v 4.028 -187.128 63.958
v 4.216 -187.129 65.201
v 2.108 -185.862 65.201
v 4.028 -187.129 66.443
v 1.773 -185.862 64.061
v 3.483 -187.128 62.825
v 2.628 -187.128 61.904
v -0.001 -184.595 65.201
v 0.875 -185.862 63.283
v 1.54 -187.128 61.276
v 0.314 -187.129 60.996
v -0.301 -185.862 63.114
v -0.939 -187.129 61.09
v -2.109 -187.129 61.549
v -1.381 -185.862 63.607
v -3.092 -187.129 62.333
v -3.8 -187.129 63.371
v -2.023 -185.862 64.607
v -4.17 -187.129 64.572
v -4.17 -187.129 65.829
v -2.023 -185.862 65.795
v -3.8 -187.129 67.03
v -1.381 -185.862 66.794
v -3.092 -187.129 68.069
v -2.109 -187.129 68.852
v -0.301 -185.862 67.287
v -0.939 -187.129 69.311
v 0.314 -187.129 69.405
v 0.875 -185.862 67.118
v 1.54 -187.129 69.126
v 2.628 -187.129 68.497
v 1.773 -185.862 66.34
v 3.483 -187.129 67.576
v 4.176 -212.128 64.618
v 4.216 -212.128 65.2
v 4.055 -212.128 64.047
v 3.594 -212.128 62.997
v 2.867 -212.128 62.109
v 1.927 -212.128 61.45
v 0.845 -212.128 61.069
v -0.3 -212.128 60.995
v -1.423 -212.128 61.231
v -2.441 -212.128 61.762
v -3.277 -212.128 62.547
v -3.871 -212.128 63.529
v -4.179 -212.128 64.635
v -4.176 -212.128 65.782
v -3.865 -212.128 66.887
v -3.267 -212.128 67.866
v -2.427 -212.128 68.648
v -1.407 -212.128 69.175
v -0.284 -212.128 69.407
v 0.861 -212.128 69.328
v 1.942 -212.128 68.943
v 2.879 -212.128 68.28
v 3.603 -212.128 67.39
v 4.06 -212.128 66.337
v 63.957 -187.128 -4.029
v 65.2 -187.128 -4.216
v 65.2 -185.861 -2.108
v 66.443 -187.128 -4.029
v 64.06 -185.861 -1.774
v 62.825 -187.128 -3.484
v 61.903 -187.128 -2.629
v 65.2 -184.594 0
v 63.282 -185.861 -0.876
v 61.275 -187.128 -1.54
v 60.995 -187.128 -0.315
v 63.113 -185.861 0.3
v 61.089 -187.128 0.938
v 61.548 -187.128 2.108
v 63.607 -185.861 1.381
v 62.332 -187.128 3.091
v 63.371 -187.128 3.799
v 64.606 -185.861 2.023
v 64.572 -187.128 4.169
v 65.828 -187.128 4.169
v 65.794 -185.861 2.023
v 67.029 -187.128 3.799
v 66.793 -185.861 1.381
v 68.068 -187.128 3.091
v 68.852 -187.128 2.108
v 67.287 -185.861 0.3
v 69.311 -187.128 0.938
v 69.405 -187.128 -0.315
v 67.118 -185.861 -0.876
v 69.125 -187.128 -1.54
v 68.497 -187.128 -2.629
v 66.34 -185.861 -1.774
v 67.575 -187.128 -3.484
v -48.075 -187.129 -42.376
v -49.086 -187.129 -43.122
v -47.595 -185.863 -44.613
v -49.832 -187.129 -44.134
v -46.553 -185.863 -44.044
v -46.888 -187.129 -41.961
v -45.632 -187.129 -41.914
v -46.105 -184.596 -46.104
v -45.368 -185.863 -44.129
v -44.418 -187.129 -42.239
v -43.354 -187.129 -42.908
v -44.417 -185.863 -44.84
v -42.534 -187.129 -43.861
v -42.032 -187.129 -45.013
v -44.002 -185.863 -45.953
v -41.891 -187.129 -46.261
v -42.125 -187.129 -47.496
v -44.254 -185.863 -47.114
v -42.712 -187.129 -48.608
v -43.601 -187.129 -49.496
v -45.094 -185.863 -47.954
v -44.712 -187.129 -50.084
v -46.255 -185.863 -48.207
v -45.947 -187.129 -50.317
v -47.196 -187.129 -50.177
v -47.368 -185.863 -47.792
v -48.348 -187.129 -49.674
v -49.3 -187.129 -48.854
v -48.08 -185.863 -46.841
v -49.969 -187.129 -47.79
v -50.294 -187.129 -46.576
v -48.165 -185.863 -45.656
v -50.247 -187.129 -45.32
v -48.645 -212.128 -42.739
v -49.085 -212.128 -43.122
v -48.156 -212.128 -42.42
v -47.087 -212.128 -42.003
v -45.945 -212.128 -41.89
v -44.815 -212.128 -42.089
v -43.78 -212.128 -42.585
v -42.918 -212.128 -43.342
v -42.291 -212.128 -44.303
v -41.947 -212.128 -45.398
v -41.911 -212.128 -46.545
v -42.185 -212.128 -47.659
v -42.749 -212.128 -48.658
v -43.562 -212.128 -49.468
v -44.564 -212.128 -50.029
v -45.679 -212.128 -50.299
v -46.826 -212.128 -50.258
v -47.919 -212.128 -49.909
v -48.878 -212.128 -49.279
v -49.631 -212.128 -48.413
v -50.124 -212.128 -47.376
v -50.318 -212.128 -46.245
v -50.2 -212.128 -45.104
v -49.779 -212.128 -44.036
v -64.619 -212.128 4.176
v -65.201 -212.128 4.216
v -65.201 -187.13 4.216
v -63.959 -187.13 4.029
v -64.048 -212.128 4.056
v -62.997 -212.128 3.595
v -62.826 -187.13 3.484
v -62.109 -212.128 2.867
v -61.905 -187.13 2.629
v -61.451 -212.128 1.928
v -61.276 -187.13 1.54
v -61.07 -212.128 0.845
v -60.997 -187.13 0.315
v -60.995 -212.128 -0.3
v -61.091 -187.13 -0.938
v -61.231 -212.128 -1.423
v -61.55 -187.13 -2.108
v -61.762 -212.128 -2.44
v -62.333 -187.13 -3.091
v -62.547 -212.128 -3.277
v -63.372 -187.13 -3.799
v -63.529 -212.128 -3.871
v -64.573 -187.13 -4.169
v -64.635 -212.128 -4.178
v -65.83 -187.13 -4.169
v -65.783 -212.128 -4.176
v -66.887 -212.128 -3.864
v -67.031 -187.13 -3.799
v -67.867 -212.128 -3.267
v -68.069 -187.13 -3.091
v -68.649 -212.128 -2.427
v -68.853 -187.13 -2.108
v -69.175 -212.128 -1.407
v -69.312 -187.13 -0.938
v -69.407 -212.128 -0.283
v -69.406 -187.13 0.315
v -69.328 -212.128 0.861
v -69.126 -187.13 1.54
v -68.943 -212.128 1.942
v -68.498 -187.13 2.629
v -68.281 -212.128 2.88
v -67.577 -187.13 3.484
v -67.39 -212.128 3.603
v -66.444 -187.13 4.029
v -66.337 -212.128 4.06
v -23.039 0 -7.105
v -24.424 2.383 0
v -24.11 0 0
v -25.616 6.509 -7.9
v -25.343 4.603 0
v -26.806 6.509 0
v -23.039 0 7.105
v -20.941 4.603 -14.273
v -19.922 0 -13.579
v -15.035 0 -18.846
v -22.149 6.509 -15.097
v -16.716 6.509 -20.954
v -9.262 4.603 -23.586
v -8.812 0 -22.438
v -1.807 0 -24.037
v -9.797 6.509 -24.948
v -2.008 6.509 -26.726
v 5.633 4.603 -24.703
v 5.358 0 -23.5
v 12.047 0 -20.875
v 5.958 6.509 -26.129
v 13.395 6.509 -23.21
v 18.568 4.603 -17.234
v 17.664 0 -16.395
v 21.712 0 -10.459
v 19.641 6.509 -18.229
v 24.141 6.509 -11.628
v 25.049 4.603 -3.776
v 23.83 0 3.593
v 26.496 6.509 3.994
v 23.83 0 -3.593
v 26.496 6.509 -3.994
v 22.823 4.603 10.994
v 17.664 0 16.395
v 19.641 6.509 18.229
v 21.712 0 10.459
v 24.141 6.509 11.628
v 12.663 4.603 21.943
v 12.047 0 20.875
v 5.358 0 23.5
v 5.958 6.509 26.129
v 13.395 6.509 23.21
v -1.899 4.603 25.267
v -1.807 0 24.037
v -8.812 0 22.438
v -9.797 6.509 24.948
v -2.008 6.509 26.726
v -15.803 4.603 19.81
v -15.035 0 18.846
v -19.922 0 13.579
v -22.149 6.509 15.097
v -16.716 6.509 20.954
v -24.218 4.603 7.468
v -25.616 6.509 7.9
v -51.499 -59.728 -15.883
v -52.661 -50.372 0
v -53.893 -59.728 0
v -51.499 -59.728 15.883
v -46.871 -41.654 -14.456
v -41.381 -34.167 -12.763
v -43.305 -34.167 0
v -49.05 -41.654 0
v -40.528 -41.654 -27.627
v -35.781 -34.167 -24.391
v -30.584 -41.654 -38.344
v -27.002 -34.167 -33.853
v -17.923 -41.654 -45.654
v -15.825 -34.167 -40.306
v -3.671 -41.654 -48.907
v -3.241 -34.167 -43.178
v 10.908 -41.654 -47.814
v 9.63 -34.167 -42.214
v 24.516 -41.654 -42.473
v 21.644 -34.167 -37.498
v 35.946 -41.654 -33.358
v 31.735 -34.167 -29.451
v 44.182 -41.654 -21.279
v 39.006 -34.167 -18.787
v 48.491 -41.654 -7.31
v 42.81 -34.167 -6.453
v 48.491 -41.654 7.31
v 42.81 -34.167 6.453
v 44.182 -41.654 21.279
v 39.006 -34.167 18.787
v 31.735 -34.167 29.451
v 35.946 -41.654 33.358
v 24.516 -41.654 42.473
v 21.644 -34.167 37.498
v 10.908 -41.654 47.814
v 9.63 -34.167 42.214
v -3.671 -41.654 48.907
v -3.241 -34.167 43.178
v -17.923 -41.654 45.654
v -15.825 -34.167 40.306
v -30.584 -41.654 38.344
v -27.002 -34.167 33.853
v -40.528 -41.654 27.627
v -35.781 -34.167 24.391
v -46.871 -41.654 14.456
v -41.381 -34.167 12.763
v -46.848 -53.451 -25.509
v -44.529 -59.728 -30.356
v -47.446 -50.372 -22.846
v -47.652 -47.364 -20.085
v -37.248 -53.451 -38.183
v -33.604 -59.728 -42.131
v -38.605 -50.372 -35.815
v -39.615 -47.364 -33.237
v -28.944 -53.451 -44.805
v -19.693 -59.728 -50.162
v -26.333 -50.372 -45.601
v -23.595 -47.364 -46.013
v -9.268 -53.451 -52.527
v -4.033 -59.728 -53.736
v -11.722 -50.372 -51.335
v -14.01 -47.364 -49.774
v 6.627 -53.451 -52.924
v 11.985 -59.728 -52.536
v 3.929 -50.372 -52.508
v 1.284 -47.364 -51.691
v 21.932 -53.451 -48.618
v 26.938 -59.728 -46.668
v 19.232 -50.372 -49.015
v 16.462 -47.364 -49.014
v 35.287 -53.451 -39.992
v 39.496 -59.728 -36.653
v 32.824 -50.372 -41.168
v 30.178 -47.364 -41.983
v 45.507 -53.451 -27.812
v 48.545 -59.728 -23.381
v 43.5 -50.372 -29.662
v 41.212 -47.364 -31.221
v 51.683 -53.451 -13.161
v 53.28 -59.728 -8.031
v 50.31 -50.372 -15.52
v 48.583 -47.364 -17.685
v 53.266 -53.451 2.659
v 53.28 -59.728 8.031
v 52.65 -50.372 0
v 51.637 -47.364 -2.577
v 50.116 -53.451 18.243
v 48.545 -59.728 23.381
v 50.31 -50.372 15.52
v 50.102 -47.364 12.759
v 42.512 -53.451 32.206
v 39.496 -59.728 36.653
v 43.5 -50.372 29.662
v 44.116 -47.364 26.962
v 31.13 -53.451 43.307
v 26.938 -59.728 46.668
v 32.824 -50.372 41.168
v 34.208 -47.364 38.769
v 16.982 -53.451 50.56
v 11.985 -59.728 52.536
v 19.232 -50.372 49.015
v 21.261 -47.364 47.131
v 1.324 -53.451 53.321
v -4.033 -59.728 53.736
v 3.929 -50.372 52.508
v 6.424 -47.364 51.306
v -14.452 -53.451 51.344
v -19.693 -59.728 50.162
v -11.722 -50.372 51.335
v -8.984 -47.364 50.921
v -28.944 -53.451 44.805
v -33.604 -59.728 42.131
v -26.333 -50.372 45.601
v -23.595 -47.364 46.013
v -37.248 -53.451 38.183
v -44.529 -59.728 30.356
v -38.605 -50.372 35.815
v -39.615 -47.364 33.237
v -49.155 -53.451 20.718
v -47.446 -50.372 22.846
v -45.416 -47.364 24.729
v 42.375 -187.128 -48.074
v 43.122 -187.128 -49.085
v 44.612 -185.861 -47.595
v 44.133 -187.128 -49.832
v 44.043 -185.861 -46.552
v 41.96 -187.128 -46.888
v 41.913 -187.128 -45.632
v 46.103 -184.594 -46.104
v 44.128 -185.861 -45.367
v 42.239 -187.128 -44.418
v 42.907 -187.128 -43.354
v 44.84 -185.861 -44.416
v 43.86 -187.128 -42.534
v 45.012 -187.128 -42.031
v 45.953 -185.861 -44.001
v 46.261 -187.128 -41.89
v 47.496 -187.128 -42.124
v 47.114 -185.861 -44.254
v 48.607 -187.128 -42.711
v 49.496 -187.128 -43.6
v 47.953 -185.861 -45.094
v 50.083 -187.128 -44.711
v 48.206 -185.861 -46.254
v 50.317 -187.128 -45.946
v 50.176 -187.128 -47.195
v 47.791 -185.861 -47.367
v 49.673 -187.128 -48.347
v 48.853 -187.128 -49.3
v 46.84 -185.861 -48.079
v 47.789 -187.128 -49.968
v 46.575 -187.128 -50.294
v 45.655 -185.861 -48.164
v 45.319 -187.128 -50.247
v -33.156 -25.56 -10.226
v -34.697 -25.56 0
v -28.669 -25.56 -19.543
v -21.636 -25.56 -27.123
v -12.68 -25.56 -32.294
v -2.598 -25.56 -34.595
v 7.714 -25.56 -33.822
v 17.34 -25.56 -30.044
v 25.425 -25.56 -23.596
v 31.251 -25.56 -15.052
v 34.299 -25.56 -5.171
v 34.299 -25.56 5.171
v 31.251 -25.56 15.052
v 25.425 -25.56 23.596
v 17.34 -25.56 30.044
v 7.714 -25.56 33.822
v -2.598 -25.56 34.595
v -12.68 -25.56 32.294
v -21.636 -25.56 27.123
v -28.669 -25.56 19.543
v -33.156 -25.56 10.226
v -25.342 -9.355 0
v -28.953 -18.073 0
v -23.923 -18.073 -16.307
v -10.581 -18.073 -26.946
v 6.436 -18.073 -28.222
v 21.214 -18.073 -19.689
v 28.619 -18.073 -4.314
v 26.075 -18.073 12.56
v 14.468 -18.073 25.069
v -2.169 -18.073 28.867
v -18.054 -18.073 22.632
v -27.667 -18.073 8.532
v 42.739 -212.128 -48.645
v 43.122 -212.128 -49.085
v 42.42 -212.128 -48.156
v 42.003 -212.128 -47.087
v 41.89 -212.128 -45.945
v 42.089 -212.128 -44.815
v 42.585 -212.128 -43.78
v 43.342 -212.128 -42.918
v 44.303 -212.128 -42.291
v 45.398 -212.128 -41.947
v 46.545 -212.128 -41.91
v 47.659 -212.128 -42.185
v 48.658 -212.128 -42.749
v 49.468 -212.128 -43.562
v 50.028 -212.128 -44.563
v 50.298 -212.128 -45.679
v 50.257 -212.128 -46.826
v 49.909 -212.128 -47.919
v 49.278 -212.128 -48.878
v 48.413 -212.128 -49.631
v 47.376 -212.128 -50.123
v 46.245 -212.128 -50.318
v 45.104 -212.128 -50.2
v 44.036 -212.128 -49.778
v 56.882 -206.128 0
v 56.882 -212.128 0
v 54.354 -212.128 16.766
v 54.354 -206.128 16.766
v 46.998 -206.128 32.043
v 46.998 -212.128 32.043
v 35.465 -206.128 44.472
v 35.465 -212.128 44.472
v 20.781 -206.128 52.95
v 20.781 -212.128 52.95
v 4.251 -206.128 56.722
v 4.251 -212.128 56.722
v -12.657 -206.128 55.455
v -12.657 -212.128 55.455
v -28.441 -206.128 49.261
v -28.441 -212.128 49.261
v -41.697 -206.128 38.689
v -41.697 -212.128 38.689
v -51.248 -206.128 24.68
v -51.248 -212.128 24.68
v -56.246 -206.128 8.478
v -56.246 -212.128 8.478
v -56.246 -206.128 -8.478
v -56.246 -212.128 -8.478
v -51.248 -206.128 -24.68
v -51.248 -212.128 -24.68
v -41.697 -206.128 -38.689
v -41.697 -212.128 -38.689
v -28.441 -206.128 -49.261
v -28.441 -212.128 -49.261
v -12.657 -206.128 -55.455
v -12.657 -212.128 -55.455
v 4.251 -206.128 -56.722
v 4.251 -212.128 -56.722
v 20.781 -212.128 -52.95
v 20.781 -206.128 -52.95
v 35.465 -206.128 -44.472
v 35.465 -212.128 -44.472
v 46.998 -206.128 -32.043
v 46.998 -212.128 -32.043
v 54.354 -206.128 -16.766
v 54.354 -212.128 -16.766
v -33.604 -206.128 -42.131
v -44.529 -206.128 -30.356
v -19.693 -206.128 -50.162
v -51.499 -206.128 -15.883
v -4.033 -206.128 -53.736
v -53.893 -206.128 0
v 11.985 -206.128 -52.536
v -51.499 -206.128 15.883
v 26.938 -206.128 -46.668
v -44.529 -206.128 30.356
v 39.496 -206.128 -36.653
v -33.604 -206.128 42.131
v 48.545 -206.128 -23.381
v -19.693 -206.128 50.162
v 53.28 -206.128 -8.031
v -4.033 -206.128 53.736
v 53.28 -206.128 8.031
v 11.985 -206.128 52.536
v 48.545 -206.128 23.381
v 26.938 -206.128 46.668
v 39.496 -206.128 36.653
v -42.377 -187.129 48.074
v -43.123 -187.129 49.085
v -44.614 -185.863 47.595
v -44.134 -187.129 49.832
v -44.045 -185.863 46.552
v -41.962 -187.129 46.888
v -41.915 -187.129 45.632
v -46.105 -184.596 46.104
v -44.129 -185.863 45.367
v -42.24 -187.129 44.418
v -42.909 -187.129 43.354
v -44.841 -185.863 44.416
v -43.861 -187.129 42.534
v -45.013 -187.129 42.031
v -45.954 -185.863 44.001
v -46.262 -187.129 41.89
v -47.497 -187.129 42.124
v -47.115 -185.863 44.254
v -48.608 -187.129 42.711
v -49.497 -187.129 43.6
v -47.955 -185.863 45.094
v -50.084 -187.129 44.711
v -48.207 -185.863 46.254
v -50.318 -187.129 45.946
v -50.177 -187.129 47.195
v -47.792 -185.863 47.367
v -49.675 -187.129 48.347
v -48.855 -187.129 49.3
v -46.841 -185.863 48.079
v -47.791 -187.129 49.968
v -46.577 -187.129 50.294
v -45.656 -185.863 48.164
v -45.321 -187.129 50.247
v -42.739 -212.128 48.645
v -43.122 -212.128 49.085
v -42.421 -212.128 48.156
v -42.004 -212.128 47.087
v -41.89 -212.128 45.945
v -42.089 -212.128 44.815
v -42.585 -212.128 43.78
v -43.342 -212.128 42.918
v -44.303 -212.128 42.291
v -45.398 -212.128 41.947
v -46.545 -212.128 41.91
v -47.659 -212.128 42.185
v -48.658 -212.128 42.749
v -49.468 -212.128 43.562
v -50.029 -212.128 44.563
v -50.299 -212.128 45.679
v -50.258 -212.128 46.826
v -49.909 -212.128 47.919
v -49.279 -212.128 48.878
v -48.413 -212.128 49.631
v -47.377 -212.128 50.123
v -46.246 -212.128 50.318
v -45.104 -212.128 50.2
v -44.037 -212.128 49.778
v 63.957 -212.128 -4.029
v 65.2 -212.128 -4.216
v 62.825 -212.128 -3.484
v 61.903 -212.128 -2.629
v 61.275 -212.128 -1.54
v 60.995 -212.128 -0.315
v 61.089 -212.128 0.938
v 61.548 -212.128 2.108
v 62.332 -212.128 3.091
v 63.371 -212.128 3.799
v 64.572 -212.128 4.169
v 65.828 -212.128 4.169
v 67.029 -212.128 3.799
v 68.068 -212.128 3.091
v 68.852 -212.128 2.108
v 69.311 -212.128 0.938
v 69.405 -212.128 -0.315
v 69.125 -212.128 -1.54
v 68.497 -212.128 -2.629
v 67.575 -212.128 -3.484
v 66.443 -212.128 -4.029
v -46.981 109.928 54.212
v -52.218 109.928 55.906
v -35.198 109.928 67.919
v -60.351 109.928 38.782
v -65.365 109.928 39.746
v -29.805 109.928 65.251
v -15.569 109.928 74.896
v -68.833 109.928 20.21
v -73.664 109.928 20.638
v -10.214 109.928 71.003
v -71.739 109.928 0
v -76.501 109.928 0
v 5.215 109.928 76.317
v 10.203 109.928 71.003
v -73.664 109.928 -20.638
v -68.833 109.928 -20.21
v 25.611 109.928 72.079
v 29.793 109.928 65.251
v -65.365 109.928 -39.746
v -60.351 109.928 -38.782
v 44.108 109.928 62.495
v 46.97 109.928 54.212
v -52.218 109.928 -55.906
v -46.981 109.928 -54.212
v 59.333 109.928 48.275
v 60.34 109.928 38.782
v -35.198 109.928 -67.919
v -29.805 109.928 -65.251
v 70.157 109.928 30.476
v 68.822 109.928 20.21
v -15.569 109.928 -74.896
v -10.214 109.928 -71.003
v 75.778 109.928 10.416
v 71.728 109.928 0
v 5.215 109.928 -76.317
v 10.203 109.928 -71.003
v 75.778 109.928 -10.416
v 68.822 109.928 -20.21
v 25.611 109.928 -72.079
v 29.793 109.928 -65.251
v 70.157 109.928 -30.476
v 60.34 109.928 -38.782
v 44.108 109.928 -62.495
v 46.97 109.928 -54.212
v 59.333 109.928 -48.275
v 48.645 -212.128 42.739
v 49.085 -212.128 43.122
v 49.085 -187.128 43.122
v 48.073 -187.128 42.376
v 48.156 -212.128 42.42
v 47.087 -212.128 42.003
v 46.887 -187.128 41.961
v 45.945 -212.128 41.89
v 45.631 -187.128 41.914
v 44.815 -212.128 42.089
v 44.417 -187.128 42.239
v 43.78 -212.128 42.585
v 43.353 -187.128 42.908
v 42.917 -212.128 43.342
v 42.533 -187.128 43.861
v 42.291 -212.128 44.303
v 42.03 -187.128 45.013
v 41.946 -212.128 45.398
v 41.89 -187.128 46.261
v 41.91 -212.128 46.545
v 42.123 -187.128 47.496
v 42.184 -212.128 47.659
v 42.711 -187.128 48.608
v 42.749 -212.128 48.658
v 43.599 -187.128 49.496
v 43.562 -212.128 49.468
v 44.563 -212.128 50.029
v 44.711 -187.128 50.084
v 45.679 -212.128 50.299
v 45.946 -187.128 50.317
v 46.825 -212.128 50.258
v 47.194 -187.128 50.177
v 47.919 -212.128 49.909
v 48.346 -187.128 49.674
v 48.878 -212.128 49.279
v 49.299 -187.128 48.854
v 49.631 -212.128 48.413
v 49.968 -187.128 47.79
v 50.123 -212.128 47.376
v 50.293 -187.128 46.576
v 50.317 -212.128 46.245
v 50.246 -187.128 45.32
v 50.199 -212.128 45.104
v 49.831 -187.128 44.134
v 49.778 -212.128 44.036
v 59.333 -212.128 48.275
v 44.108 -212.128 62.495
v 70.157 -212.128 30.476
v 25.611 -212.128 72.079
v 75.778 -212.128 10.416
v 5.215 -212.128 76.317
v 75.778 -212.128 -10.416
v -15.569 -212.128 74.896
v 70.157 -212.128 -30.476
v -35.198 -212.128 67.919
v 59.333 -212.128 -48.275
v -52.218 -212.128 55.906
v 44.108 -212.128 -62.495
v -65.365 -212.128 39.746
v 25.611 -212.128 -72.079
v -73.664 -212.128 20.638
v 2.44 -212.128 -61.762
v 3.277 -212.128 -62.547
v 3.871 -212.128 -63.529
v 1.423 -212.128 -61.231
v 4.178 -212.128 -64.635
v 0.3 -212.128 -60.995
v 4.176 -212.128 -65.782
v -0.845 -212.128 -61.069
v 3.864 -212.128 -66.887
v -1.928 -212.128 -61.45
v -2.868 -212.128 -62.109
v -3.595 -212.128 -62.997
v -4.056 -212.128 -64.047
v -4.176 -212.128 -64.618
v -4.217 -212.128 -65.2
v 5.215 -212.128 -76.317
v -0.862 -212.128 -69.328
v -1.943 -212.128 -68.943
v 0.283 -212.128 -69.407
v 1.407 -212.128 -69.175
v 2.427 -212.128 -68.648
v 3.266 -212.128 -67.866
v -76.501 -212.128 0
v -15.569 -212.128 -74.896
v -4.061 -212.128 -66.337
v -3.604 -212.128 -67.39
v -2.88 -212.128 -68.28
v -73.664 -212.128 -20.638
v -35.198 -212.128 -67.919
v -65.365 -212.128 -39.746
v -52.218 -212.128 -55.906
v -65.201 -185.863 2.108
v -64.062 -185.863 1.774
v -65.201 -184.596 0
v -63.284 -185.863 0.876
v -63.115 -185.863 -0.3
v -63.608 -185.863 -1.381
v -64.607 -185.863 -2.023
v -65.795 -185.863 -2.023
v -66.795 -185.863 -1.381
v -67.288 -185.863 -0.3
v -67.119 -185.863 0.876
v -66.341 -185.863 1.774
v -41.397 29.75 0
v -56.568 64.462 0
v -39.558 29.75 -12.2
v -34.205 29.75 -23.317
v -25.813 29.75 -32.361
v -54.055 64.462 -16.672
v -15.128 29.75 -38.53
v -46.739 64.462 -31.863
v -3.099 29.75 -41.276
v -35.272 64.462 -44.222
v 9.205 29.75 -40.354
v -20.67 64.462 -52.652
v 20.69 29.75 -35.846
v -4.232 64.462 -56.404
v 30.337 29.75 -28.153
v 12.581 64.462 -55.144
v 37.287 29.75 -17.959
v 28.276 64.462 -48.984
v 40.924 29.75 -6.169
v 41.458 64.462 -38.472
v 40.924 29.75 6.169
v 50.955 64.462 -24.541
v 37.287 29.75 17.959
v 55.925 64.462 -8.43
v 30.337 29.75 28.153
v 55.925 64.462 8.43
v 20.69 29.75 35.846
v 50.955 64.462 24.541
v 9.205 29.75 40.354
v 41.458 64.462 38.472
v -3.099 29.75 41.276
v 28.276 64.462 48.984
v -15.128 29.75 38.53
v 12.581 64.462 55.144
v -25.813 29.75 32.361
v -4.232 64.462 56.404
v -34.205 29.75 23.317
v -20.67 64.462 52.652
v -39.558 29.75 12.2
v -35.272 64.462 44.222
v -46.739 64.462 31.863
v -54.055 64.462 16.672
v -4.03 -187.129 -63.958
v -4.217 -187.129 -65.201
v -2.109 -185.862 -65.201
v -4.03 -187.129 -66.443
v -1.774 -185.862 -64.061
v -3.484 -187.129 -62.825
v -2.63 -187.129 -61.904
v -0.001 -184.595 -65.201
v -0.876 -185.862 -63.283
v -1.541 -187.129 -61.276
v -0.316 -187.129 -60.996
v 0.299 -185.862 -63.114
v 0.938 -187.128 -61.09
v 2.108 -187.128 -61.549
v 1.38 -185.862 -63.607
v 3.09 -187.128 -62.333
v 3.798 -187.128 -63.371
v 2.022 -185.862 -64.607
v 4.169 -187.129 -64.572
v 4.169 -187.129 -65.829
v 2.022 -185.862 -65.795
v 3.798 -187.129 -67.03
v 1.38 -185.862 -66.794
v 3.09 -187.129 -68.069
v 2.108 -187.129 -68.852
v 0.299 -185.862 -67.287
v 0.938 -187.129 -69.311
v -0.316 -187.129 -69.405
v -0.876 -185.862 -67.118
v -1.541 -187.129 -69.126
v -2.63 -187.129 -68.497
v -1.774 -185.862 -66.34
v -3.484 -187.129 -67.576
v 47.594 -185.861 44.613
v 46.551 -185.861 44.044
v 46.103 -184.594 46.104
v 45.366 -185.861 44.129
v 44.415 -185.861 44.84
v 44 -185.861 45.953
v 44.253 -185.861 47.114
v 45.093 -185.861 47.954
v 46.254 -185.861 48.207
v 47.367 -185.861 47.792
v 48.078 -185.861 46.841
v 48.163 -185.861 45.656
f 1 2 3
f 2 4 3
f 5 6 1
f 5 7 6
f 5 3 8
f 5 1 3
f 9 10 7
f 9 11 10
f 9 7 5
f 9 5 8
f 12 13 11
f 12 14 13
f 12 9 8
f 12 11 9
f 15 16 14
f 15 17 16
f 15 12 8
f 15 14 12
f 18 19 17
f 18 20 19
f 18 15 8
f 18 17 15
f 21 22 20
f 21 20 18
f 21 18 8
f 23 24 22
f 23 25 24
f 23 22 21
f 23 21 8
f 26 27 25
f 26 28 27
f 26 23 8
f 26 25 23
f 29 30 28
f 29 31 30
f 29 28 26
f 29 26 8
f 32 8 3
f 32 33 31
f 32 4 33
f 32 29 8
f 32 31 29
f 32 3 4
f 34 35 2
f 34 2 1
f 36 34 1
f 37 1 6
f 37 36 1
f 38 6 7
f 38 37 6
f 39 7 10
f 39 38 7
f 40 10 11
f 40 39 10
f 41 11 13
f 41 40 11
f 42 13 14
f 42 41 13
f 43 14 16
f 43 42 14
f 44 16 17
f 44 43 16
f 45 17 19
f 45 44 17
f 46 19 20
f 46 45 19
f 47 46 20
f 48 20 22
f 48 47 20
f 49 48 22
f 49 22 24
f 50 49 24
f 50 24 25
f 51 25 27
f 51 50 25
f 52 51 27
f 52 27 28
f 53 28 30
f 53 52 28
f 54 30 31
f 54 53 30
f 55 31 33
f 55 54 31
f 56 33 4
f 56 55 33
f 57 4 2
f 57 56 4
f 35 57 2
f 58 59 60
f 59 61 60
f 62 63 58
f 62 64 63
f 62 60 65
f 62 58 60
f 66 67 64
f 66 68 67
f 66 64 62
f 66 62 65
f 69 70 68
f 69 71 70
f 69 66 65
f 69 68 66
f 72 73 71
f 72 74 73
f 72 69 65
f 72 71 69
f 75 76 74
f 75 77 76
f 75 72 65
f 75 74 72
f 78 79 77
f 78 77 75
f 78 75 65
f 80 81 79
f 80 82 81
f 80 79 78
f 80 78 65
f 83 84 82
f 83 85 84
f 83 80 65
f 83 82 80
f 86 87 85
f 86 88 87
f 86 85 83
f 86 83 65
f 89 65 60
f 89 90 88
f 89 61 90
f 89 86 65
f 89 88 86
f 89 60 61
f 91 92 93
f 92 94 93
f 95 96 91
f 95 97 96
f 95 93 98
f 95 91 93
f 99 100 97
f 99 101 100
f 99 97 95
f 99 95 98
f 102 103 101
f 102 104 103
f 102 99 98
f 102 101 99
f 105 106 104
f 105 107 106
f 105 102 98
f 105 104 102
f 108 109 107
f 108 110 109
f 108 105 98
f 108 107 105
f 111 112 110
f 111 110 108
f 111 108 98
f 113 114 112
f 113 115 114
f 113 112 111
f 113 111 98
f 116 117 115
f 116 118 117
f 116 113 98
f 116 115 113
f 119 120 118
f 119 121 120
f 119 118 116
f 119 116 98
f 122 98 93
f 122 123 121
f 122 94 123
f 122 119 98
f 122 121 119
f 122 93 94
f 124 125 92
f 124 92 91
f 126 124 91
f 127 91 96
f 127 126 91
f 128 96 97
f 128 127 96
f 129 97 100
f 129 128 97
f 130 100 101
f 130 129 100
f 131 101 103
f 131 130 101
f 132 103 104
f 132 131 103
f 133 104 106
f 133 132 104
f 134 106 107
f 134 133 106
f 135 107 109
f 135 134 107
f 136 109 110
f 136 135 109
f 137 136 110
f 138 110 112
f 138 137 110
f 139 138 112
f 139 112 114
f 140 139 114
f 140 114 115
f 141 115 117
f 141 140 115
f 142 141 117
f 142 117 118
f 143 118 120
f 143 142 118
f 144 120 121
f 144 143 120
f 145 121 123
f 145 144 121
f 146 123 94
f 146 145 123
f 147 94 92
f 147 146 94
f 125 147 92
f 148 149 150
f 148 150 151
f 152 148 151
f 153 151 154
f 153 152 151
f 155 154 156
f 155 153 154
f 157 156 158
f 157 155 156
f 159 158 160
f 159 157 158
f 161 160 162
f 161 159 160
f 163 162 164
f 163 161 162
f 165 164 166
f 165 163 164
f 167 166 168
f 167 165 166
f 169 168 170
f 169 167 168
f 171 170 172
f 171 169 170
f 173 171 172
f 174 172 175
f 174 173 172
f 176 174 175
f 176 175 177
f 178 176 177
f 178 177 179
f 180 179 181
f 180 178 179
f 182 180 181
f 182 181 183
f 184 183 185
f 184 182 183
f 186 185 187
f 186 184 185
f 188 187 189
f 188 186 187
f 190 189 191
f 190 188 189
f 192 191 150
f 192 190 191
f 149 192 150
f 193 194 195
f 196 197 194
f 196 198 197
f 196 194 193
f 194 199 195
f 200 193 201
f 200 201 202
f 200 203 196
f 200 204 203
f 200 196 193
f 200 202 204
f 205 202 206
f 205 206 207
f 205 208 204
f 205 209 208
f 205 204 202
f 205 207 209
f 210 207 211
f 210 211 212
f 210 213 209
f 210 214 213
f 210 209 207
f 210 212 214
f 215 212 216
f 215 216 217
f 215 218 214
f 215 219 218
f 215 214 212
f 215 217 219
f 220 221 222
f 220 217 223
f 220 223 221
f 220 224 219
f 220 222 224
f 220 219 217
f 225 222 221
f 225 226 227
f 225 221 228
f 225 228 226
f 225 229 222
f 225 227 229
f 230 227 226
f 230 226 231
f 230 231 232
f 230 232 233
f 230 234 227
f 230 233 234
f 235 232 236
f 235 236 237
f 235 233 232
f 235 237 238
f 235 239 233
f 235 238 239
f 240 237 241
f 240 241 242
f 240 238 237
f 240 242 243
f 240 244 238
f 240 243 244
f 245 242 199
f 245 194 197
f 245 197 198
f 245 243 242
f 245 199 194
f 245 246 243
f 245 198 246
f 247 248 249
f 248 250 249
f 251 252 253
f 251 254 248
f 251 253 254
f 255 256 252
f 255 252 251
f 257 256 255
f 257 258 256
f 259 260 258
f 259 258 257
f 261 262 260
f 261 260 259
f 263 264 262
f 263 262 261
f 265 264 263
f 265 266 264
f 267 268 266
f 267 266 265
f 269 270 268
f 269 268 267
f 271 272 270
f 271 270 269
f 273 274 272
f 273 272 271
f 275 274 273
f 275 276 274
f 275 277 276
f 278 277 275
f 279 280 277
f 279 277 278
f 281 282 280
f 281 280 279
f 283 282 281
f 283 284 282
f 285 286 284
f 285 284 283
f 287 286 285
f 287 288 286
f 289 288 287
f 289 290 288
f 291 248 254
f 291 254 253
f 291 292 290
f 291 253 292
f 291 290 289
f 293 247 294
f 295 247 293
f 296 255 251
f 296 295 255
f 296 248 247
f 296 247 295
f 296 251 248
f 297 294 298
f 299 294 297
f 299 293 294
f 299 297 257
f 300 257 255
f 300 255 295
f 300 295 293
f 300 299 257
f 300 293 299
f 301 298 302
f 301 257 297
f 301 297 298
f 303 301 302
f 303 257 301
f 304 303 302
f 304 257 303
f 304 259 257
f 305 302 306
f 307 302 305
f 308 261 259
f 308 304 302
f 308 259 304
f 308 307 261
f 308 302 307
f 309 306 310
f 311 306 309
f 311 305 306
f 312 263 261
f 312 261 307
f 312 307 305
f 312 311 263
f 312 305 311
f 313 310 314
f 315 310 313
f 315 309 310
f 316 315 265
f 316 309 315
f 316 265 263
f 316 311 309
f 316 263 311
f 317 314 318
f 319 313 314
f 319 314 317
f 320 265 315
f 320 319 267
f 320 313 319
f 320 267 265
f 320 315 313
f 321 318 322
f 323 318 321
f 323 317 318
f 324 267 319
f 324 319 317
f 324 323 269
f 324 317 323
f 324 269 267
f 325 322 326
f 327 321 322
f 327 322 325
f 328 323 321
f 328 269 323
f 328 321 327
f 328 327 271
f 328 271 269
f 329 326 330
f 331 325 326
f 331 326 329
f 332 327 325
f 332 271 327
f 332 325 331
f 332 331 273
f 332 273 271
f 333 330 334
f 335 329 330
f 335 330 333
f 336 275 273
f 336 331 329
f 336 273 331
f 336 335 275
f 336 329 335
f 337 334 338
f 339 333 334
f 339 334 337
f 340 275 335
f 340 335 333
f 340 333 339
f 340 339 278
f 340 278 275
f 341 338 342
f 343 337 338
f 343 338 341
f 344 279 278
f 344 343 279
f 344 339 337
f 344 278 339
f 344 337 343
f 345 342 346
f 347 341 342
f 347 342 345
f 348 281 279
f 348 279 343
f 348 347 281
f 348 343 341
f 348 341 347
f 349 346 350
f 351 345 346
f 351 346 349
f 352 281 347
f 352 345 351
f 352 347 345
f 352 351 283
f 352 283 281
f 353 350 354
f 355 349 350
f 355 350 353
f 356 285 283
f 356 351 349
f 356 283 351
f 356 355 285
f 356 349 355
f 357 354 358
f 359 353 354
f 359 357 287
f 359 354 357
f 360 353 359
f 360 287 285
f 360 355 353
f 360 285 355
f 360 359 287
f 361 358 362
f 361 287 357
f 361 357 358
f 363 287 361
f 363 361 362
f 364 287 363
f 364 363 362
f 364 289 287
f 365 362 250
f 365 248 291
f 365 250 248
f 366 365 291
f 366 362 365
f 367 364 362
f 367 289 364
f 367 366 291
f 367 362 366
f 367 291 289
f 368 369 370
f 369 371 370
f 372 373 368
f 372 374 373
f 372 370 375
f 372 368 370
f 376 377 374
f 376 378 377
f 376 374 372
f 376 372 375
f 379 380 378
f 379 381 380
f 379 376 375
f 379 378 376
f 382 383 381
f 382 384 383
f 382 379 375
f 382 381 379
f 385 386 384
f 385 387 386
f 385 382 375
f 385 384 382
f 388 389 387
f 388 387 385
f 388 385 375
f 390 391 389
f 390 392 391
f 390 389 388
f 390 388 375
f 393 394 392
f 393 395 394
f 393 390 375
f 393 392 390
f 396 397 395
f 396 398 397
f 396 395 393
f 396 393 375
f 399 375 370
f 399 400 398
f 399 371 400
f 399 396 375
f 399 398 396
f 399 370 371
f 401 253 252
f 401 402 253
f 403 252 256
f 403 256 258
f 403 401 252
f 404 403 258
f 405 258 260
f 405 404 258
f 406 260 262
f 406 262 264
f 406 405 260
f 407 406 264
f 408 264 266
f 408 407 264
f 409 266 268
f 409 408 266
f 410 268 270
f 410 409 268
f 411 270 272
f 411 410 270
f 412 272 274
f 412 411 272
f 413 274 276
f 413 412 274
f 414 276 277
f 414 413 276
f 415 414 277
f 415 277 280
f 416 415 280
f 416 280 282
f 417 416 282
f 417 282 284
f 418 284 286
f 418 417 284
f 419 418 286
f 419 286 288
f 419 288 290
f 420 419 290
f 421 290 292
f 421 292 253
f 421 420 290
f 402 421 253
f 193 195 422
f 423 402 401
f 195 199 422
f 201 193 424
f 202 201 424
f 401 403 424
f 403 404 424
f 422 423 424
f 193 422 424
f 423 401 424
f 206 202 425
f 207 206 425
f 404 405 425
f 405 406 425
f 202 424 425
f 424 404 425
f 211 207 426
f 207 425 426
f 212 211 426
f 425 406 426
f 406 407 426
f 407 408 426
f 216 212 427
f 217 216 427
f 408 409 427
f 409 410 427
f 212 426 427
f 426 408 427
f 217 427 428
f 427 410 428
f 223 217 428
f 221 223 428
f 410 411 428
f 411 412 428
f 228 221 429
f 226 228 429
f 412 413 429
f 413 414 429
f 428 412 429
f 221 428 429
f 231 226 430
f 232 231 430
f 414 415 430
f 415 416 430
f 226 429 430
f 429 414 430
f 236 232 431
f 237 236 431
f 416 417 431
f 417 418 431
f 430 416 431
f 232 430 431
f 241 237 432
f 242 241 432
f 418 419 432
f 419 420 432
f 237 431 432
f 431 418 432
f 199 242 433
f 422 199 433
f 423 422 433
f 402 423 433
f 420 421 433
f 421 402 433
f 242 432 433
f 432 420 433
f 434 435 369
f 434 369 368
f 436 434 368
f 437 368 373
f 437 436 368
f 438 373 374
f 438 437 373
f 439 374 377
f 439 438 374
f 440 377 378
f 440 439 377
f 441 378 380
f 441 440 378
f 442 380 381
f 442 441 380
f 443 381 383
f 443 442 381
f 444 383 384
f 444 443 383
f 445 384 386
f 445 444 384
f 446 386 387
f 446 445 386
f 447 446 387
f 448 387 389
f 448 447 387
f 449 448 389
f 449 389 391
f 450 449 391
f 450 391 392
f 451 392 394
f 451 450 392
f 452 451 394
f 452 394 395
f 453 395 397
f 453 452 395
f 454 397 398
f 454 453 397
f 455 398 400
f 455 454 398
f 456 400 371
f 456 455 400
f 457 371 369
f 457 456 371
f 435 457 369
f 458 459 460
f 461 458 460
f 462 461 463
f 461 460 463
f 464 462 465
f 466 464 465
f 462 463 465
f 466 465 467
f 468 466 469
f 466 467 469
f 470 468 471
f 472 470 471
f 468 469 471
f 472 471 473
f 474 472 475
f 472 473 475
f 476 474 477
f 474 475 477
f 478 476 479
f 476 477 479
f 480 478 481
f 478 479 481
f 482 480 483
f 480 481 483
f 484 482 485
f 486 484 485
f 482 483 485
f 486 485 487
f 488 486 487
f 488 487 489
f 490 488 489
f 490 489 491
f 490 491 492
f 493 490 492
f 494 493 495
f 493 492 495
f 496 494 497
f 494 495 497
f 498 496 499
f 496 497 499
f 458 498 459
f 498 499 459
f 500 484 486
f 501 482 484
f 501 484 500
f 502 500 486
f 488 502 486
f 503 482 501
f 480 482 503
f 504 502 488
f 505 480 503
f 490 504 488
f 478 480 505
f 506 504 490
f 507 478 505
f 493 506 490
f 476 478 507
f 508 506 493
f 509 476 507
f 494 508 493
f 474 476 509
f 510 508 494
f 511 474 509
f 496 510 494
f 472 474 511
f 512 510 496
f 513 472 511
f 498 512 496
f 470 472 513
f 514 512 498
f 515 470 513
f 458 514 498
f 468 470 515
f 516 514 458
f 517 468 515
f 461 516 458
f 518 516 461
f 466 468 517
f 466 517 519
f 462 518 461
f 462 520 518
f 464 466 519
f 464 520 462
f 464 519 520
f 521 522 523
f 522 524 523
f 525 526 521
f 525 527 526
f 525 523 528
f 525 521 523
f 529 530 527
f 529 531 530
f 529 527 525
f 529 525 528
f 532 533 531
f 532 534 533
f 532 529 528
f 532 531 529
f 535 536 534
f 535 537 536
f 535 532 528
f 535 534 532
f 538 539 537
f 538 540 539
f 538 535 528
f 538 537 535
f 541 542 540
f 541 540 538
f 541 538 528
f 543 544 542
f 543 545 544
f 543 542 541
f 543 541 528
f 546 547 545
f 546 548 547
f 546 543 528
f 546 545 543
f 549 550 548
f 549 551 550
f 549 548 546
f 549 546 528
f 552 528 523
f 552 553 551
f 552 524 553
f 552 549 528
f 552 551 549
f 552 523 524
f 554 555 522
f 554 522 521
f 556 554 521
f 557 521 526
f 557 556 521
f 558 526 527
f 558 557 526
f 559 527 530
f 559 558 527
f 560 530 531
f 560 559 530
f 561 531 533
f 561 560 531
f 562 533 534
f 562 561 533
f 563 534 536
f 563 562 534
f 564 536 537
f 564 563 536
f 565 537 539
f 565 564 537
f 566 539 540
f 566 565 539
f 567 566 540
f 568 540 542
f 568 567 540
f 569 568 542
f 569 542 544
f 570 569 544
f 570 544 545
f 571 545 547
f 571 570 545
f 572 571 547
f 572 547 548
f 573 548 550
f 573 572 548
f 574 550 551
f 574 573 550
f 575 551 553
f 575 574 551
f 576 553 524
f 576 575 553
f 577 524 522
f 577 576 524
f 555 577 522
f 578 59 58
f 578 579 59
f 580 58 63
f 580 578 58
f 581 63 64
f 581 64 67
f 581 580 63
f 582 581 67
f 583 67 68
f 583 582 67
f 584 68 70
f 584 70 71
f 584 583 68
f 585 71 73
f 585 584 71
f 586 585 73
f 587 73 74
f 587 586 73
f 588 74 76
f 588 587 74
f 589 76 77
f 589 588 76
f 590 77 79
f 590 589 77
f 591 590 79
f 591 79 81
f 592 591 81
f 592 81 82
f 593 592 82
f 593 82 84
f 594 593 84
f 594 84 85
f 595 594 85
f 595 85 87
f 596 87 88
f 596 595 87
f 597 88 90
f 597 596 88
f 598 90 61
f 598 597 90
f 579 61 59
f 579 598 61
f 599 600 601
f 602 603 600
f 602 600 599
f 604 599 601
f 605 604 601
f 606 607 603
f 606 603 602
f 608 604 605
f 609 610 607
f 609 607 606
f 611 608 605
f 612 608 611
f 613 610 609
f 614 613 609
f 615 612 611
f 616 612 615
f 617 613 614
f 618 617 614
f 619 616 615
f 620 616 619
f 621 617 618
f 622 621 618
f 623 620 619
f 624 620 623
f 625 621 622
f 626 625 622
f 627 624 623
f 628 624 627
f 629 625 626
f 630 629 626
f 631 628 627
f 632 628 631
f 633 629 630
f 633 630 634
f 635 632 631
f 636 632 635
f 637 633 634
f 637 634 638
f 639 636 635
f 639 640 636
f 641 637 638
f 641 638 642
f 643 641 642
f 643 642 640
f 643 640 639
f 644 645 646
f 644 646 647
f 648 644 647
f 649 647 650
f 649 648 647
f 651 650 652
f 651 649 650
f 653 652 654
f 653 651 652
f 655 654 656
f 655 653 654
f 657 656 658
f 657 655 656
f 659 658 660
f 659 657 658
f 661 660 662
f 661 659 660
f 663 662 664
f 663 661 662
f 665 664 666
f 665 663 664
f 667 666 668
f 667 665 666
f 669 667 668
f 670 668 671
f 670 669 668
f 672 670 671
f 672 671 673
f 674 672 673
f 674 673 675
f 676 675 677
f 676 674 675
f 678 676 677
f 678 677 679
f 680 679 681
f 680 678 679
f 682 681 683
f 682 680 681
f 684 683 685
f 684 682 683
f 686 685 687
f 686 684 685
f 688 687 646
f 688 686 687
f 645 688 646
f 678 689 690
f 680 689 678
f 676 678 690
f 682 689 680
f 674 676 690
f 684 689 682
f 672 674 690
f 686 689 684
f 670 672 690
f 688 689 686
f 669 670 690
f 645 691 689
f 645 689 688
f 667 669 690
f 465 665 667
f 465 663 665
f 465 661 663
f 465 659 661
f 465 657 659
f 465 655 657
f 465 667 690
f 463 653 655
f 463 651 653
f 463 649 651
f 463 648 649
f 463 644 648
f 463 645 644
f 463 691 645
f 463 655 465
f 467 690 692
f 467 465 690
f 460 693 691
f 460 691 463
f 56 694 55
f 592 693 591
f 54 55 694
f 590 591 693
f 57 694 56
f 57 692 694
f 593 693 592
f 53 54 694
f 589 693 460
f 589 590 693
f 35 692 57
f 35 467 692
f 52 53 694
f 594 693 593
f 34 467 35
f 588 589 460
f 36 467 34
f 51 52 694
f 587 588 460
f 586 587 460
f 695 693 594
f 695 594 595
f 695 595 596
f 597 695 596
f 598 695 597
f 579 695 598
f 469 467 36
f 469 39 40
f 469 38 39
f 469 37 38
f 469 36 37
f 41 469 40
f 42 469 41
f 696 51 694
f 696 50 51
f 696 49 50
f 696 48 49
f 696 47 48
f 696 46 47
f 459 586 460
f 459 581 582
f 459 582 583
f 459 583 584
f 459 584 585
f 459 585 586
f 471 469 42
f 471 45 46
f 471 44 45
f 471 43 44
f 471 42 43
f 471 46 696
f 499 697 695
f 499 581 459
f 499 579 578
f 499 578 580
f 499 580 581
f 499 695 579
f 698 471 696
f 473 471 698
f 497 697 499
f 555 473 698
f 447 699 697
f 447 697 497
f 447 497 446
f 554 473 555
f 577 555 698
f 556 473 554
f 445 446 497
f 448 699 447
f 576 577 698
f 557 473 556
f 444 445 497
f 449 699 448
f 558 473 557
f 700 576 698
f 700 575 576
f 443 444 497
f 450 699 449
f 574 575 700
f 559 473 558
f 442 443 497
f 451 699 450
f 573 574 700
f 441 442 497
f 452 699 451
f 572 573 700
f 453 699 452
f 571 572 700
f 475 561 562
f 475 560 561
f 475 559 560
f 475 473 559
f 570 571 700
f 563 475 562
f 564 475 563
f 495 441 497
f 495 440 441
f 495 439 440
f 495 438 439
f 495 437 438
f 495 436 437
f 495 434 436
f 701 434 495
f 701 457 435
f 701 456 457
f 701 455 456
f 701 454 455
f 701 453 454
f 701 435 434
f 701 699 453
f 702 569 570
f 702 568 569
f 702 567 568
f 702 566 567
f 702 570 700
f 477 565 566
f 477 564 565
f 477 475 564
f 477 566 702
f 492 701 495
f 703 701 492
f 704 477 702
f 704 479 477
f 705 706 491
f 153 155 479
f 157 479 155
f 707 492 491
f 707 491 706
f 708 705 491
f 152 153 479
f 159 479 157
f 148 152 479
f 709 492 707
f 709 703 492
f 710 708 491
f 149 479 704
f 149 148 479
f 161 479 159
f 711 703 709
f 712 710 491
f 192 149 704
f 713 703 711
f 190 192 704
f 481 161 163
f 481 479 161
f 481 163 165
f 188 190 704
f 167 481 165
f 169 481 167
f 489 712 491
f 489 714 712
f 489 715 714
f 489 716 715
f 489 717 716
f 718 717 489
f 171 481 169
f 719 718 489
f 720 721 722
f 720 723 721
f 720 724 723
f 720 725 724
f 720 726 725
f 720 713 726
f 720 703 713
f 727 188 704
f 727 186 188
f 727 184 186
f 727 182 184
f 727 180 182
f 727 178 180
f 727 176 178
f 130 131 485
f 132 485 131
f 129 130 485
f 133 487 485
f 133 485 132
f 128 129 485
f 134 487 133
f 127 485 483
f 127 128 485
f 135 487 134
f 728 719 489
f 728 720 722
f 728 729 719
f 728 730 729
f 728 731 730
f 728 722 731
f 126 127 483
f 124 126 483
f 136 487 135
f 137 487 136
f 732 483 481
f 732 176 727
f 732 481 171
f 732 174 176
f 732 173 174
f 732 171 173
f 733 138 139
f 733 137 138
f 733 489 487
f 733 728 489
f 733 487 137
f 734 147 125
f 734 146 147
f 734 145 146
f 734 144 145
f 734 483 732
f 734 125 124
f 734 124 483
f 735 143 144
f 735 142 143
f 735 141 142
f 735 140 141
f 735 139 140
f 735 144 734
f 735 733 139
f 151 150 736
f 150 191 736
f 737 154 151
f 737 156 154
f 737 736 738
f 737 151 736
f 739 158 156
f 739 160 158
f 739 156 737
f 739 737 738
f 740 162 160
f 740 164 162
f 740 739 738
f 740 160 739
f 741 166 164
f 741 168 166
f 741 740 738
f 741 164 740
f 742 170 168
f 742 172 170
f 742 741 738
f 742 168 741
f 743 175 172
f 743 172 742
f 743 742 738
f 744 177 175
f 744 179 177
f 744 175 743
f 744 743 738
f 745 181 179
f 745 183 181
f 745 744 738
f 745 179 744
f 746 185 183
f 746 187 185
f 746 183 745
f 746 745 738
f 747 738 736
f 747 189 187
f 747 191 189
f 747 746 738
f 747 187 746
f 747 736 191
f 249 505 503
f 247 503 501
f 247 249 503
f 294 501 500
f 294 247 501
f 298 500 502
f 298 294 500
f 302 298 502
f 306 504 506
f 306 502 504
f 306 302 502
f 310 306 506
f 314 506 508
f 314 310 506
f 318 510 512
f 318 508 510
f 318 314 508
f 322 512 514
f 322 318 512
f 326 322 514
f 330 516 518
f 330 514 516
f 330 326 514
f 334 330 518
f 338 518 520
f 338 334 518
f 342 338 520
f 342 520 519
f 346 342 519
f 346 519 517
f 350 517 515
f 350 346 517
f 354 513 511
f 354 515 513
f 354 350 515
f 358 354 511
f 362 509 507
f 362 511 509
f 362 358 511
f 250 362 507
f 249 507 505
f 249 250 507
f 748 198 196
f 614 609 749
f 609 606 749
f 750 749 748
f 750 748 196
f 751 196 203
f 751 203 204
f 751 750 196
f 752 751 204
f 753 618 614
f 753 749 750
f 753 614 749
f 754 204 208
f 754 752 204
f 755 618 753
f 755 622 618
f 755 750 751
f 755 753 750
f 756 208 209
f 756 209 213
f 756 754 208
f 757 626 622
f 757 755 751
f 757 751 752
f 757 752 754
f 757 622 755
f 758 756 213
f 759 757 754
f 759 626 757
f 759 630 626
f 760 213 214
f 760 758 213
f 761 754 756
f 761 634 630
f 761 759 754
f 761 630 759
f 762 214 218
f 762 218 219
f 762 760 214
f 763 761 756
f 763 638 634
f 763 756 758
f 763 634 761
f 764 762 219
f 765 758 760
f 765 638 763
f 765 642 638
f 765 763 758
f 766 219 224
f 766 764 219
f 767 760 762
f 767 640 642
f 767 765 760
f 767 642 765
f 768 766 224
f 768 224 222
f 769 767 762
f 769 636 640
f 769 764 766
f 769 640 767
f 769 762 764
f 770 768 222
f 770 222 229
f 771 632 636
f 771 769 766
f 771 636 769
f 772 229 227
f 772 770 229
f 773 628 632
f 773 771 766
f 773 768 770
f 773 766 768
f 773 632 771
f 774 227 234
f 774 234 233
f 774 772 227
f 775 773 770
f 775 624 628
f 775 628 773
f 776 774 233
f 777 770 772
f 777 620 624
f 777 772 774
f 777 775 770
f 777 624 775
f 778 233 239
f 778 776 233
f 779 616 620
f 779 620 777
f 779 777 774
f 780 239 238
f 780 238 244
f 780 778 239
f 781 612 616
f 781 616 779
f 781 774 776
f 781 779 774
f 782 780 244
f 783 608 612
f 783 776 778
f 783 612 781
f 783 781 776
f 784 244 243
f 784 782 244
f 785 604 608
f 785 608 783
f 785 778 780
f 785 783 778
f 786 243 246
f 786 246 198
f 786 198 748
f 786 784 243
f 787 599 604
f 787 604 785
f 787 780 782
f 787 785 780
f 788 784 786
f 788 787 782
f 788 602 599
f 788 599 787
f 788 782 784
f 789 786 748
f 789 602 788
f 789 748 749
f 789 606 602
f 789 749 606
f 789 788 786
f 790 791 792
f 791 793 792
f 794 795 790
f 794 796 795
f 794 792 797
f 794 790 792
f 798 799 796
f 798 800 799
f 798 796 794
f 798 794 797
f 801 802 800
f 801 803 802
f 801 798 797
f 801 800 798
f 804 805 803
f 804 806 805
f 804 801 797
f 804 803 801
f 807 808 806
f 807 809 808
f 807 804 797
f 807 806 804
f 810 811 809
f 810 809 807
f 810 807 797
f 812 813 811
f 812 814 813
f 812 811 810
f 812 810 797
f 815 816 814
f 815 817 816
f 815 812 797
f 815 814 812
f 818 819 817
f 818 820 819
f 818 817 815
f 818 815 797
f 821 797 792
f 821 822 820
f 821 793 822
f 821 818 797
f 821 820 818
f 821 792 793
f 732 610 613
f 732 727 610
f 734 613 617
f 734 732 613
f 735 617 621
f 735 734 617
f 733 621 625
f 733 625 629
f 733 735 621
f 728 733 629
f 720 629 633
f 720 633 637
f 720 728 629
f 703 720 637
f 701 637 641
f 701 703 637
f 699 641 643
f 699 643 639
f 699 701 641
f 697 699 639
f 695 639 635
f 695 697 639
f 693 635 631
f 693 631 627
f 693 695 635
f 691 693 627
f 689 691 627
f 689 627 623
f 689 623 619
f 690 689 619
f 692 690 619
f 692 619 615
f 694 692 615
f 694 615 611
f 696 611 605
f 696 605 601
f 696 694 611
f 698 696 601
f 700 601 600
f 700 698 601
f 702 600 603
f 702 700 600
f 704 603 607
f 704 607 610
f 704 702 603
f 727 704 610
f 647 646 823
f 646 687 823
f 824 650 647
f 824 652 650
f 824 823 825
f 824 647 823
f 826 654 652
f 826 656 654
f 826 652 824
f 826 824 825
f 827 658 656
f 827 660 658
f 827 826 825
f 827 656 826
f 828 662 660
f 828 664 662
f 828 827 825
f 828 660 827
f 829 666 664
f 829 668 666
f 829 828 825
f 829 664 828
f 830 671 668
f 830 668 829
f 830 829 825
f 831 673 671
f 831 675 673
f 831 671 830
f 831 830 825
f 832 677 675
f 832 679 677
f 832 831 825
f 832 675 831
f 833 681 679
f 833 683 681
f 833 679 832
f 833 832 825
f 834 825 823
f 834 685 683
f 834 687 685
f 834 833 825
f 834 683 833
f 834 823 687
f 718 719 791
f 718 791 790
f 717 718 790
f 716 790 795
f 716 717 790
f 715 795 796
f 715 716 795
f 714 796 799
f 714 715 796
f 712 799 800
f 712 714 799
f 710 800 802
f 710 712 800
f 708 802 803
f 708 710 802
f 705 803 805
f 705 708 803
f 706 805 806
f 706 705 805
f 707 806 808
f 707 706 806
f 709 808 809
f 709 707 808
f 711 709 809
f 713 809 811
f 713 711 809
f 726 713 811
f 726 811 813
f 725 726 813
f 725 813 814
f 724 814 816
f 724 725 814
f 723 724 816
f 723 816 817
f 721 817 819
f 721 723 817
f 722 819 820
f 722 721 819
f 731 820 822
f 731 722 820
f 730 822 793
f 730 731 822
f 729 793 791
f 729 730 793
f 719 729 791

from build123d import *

# Parameters (mm, degrees)
CIRPATTERN1_COUNT  = 8
SKETCH9_R          = 56.881527661
SKETCH9_R_2        = 53.881527661
CUT_EXTRUDE1_DEPTH = 6


with BuildPart() as part:
    # Sketch1 → Revolve2 (revolve)
    with BuildSketch(Plane.XY, mode=Mode.PRIVATE) as revolve2_sk:
        with BuildLine():
            Line((71.727523602, 109.927507641), (76.490023602, 109.927507641))
            Line((76.490023602, 109.927507641), (76.490023602, -212.127513222))
            Line((76.490023602, -212.127513222), (53.881527661, -212.127513222))
            Line((53.881527661, -212.127513222), (53.881527661, -59.727513222))
            add(Edge.make_bspline(
                [(53.881527661, -59.727513222), (53.88152643, -59.656983157), (53.880997287, -59.515406103), (53.878621437, -59.181564616), (53.872296838, -58.904795493), (53.862811351, -58.532567488), (53.850168453, -58.212837622), (53.830417626, -57.781594443), (53.800405285, -57.280959899), (53.756193121, -56.687998165), (53.677288452, -55.848480366), (53.577426861, -55.00816586), (53.456675786, -54.17243543), (53.286810822, -53.17242524), (53.092064187, -52.177442821), (52.86637512, -51.188539083), (52.610014224, -50.207489038), (52.32928934, -49.23307774), (52.024348739, -48.265969224), (51.633537831, -47.149135067), (51.139520361, -45.890408405), (50.598733753, -44.650968804), (50.012060928, -43.432701526), (49.380120231, -42.237093239), (48.704125229, -41.066154879), (47.98447552, -39.920972657), (47.223102138, -38.804076239), (46.51986906, -37.851451785), (45.893537937, -37.055672123), (45.352817681, -36.403381282), (44.915126948, -35.894247633), (44.51477619, -35.446992657), (44.181457503, -35.084631185), (43.873924624, -34.760340151), (43.674072407, -34.551549451), (43.444392073, -34.318516288), (43.343783151, -34.217162055), (43.293911001, -34.167289665)],
                knots=[0.082637729, 0.082637729, 0.082637729, 0.082637729, 0.082637729, 0.092574926, 0.102512123, 0.11244932, 0.122386517, 0.132323714, 0.142260911, 0.162135305, 0.182009699, 0.201884093, 0.24163288, 0.261507274, 0.281381668, 0.321130456, 0.360879243, 0.380753637, 0.400628031, 0.440376819, 0.480125606, 0.519874394, 0.559623181, 0.599371969, 0.639120757, 0.678869544, 0.718618332, 0.75836712, 0.798115907, 0.817990301, 0.837864695, 0.857739089, 0.877613483, 0.88755068, 0.897487877, 0.907425074, 0.91736227, 0.91736227, 0.91736227, 0.91736227, 0.91736227], degree=4))
            Line((43.293911001, -34.167289665), (34.686282803, -25.559661468))
            add(Edge.make_bspline(
                [(24.099067874, 0.000160672), (24.099069105, -0.070367974), (24.099598252, -0.213423516), (24.101973937, -0.543022243), (24.108298331, -0.823999723), (24.117783452, -1.194661398), (24.130425744, -1.513274385), (24.146225968, -1.86177893), (24.165181227, -2.193546198), (24.19281884, -2.617908727), (24.232287047, -3.121873274), (24.303299707, -3.879818002), (24.423126678, -4.886289715), (24.599486044, -6.056550088), (24.850885233, -7.385005743), (25.151795313, -8.703413843), (25.501770623, -10.009476538), (25.900360983, -11.301658927), (26.346945392, -12.577938667), (26.841003323, -13.836726817), (27.381673122, -15.076036463), (27.968479386, -16.294449129), (28.600139398, -17.489778131), (29.276532396, -18.661127095), (29.995445102, -19.805582737), (30.758021999, -20.923699417), (31.459167193, -21.874251104), (32.088736123, -22.673284825), (32.624128416, -23.320261484), (33.072255768, -23.839844364), (33.508450026, -24.329655594), (33.935826121, -24.788323739), (34.24555864, -25.11370766), (34.536859958, -25.409488397), (34.636412425, -25.509789283), (34.686282803, -25.559661468)],
                knots=[0.082637729, 0.082637729, 0.082637729, 0.082637729, 0.082637729, 0.092574926, 0.102512123, 0.11244932, 0.122386517, 0.132323714, 0.142260911, 0.152198108, 0.162135305, 0.182009699, 0.201884093, 0.24163288, 0.281381668, 0.321130456, 0.360879243, 0.400628031, 0.440376819, 0.480125606, 0.519874394, 0.559623181, 0.599371969, 0.639120757, 0.678869544, 0.718618332, 0.75836712, 0.798115907, 0.817990301, 0.837864695, 0.857739089, 0.877613483, 0.897487877, 0.907425074, 0.91736227, 0.91736227, 0.91736227, 0.91736227, 0.91736227], degree=4))
            add(Edge.make_bspline(
                [(24.099067874, 0.000160672), (24.0990685, 0.036053324), (24.099606331, 0.110274362), (24.102023723, 0.267801742), (24.108461568, 0.427224789), (24.120533599, 0.646924939), (24.141435087, 0.901594), (24.175184719, 1.202697945), (24.226499305, 1.54221117), (24.290543701, 1.881157449), (24.367141601, 2.216515092), (24.456323571, 2.549400093), (24.557741413, 2.878253317), (24.671619071, 3.203507713), (24.797196771, 3.523787829), (24.935285977, 3.839827405), (25.084070301, 4.149442857), (25.246012222, 4.454943795), (25.416488505, 4.751462248), (25.602514721, 5.045864533), (25.79178827, 5.325679608), (26.004405474, 5.610888215), (26.178876374, 5.83307432), (26.366345756, 6.050112309), (26.504555248, 6.208802318), (26.67044207, 6.382282451), (26.744520261, 6.458639514), (26.795279203, 6.509400323)],
                knots=[0.082568816, 0.082568816, 0.082568816, 0.082568816, 0.082568816, 0.102426634, 0.122284453, 0.142142271, 0.162000089, 0.201715725, 0.241431362, 0.281146998, 0.320862634, 0.360578271, 0.400293907, 0.440009544, 0.47972518, 0.519440816, 0.559156453, 0.598872089, 0.638587725, 0.678303362, 0.718018998, 0.757734635, 0.797450271, 0.837165907, 0.857023726, 0.876881544, 0.91659718, 0.91659718, 0.91659718, 0.91659718, 0.91659718], degree=4))
            add(Edge.make_bspline(
                [(26.795279203, 6.509400323), (49.261401403, 34.636114842), (71.727523602, 109.927507641)],
                knots=[0, 0, 0, 1, 1, 1], degree=2))
        make_face()
    revolve(revolve2_sk.sketch.rotate(Axis((-0.005532126, 165.815985114, 0), (0, -1, 0)), 180), axis=Axis((-0.005532126, 165.815985114, 0), (0, -1, 0)))

    # Sketch4 → 3/8-24 Tapped Hole1 (revolve, cut)
    with BuildSketch(Plane(origin=(65.2, -212.127513222, 0), x_dir=(0, 0, -1), z_dir=(1, 0, 0))):
        Polygon((0, 0), (0, 27.533468714), (4.2164, 25), (4.2164, 0), align=None)
    f_3_8_24_tapped_hole1 = revolve(axis=Axis((65.2, -218.477513222, 0), (0, 1, 0)), mode=Mode.SUBTRACT)

    # CirPattern1: 3/8-24 Tapped Hole1 ×8 about axis
    cirpattern1_axis = Axis((0, -228.487022387, 0), (-1.634718801334702e-05, 0.9999999998663848, 0))
    for i in range(1, CIRPATTERN1_COUNT):
        add(f_3_8_24_tapped_hole1.rotate(cirpattern1_axis, i * 360 / CIRPATTERN1_COUNT), mode=Mode.SUBTRACT)

    # Sketch9 → Cut-Extrude1 (cut)
    with BuildSketch(Plane.XZ.offset(212.127513222)):
        Circle(SKETCH9_R)
        Circle(SKETCH9_R_2, mode=Mode.SUBTRACT)
    extrude(amount=-CUT_EXTRUDE1_DEPTH, mode=Mode.SUBTRACT)


with BuildPart() as cut_extrude1_kept_piece:
    # of the separate pieces the step leaves, the one the design keeps (cut_extrude1_pieces_kept)
    add(part.part.solids().sort_by_distance((-71.738587854, 109.927507641, 0))[0])


solid = cut_extrude1_kept_piece.part
